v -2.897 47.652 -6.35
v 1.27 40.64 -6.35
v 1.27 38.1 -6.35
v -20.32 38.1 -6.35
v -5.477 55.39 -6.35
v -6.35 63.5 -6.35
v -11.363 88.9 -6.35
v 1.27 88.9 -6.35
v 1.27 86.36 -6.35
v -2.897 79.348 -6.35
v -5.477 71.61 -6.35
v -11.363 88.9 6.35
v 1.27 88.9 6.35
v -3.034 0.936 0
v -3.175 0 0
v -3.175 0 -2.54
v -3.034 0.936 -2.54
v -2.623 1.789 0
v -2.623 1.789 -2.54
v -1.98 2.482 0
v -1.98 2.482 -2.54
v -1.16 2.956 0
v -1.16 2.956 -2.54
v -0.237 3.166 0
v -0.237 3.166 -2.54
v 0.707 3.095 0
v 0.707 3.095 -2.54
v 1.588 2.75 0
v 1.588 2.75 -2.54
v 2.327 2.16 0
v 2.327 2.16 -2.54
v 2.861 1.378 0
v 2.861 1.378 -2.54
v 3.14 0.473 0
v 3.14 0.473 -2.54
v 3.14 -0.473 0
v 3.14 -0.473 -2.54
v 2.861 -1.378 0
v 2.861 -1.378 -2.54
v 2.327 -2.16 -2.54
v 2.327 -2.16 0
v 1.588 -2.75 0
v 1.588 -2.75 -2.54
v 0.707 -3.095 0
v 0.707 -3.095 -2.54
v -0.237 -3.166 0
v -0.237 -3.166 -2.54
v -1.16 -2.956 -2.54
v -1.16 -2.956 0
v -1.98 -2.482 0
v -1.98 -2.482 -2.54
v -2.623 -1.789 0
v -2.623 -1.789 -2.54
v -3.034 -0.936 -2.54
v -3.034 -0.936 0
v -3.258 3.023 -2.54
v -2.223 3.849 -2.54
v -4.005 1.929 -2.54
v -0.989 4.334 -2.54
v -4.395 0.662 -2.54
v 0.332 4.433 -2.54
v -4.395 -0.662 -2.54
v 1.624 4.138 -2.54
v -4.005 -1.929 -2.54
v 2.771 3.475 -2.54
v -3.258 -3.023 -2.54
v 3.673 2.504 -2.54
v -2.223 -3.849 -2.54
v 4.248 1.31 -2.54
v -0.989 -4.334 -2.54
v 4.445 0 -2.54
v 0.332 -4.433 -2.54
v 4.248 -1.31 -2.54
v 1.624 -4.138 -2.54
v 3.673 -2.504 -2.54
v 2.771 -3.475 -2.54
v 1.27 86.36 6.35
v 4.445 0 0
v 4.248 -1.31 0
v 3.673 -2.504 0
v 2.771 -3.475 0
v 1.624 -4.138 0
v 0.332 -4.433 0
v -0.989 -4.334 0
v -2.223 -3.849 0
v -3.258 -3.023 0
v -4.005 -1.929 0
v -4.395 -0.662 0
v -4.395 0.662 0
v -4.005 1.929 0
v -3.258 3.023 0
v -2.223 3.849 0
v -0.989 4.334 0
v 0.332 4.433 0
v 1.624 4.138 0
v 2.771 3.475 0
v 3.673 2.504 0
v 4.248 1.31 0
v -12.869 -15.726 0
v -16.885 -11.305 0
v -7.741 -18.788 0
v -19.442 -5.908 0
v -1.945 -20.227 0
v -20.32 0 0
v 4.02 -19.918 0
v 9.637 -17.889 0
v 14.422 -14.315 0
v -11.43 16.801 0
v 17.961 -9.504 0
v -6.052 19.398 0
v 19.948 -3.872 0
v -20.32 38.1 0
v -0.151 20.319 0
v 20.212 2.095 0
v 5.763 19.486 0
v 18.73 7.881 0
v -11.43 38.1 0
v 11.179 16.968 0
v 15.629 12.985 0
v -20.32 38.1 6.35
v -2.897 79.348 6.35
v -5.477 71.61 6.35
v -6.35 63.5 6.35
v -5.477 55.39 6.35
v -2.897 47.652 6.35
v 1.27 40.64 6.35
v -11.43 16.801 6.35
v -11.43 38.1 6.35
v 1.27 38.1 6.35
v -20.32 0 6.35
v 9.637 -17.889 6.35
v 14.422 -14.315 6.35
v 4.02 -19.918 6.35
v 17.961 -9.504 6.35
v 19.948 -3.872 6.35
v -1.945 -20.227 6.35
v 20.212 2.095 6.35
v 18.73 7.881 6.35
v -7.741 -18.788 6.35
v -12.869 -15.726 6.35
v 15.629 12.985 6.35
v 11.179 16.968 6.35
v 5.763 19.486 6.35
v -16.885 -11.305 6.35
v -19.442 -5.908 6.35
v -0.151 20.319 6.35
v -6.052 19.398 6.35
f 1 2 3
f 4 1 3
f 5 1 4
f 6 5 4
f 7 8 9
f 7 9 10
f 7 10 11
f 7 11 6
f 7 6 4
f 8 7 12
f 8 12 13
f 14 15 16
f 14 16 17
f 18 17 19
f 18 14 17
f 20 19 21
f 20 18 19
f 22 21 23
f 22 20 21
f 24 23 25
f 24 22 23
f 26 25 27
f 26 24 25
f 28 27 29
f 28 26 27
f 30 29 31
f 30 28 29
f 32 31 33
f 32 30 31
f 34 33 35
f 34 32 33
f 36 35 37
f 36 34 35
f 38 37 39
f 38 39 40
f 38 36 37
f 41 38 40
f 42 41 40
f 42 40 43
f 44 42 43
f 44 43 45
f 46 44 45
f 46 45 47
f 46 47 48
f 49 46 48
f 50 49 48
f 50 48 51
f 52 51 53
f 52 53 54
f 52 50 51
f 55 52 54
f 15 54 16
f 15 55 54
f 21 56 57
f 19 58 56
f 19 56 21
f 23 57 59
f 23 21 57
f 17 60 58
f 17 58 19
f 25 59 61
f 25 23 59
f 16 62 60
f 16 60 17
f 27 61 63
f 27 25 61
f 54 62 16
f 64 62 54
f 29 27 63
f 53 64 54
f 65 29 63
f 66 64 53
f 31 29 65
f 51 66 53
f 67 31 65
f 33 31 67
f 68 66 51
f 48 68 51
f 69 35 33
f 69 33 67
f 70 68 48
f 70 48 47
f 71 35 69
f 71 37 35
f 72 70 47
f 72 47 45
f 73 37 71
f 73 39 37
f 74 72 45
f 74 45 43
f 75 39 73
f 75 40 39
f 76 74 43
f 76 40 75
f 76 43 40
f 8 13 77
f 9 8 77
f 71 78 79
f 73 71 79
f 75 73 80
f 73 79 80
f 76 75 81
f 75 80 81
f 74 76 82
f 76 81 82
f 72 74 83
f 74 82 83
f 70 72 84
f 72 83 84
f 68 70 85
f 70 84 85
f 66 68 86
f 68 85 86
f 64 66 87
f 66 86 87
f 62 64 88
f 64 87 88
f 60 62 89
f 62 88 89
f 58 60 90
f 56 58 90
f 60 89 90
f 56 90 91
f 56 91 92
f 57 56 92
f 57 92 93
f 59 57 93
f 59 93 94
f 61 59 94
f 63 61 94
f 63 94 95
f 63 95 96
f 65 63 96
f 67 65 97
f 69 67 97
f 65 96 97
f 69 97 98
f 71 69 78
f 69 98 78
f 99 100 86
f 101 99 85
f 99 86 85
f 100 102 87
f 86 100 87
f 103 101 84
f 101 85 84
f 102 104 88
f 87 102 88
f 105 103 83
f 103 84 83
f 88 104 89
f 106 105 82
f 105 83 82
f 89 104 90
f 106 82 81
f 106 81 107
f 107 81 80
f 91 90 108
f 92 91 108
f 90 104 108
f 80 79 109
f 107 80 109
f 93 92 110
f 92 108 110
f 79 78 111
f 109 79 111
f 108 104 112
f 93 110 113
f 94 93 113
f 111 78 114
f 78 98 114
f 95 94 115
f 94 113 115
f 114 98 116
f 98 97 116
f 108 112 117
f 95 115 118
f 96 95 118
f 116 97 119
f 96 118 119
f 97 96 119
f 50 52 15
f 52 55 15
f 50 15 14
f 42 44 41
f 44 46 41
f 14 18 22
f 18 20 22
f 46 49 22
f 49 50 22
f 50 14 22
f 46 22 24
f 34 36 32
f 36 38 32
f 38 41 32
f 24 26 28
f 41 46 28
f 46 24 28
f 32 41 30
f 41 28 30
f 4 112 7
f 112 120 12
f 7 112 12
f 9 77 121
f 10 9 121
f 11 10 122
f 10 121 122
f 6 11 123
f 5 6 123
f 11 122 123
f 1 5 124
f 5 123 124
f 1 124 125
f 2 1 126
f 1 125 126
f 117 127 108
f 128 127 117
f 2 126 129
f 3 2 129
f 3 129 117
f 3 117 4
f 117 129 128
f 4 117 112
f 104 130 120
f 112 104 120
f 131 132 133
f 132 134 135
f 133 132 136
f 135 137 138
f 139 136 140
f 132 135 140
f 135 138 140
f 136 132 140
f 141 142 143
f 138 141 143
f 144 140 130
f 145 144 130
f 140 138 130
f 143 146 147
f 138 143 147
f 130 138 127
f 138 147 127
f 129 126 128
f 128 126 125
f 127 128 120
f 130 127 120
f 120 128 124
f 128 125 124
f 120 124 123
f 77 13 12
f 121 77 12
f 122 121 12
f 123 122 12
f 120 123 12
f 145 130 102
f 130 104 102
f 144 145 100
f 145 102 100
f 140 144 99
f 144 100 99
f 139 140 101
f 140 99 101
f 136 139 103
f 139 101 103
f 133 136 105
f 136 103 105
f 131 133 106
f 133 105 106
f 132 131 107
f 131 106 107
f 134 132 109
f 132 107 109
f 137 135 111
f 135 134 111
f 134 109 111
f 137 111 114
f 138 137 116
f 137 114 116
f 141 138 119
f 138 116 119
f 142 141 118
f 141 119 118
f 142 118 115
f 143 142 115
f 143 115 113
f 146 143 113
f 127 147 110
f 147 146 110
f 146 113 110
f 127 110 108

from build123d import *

# Parameters (mm, degrees)
SKETCH1_R           = 20.32
BOSS_EXTRUDE1_DEPTH = 6.35
SKETCH2_R           = 4.445
SKETCH2_R_2         = 3.175
BOSS_EXTRUDE2_DEPTH = 2.54
SKETCH4_W           = 8.89
SKETCH4_H           = 38.1
BOSS_EXTRUDE3_DEPTH = 6.35
BOSS_EXTRUDE4_DEPTH = 12.7


with BuildPart() as part:
    # Sketch1 → Boss-Extrude1 (new body)
    with BuildSketch(Plane.XY):
        Circle(SKETCH1_R)
    extrude(amount=BOSS_EXTRUDE1_DEPTH)

    # Sketch2 → Boss-Extrude2 (add)
    with BuildSketch(Plane(origin=(0, 0, 0), x_dir=(-1, 0, 0), z_dir=(0, 0, -1))):
        with Locations(Location((0, 0, 0), (0, 0, 180))):
            Circle(SKETCH2_R)
        Circle(SKETCH2_R_2, mode=Mode.SUBTRACT)
    extrude(amount=BOSS_EXTRUDE2_DEPTH)

    # Sketch4 → Boss-Extrude3 (add)
    with BuildSketch(Plane.XY.offset(6.35)):
        with Locations((-15.875, 19.05)):
            Rectangle(SKETCH4_W, SKETCH4_H)
    extrude(amount=-BOSS_EXTRUDE3_DEPTH)

    # Sketch5 → Boss-Extrude4 (add)
    with BuildSketch(Plane.XY.offset(6.35)):
        with BuildLine():
            Line((-20.32, 38.1), (-11.36258938, 88.9))
            Line((-11.36258938, 88.9), (1.27, 88.9))
            Line((1.27, 88.9), (1.27, 86.36))
            ThreePointArc((1.27, 86.36), (-6.35, 63.5), (1.27, 40.64))
            Line((1.27, 40.64), (1.27, 38.1))
            Line((1.27, 38.1), (-11.43, 38.1))
            Line((-11.43, 38.1), (-20.32, 38.1))
        make_face()
    extrude(amount=-BOSS_EXTRUDE4_DEPTH)


solid = part.part
